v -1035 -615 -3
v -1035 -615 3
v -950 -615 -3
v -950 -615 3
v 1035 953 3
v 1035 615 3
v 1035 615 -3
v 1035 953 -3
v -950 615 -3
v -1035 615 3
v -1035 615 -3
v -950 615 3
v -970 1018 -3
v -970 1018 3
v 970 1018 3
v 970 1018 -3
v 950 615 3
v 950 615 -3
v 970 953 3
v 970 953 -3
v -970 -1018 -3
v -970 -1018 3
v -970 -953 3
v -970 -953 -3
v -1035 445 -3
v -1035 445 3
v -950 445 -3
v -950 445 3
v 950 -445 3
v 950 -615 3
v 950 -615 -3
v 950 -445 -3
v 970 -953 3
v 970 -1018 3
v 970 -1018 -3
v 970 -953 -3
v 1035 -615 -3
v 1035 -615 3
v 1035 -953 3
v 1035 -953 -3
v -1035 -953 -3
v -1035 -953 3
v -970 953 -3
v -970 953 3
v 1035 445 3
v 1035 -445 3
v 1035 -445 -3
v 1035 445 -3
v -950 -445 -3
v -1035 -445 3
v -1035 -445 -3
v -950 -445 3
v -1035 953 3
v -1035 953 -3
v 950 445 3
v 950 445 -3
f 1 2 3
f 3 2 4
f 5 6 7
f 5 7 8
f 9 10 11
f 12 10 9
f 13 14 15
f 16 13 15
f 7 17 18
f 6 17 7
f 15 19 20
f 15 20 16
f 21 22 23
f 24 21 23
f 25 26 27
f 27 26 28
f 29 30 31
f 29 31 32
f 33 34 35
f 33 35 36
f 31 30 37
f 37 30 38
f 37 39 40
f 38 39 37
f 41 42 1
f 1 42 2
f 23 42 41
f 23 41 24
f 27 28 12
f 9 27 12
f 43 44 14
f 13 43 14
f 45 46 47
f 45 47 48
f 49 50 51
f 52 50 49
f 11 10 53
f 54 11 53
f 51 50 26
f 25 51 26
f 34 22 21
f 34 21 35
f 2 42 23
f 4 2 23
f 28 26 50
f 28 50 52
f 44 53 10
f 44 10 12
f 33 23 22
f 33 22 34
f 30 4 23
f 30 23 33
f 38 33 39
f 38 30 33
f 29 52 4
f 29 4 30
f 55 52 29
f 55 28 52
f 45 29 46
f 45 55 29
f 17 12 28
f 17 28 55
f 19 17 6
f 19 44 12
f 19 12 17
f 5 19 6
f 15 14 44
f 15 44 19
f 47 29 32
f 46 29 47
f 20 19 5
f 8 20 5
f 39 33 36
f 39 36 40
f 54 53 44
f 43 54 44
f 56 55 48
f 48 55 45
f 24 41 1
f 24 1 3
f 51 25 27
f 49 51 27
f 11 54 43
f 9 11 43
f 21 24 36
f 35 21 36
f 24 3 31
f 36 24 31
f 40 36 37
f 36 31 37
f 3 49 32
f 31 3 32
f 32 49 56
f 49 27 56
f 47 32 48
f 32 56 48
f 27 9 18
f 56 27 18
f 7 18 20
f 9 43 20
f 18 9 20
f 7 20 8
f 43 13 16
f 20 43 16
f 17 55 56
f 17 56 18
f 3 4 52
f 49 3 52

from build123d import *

# Parameters (mm, degrees)
F0_W     = 2070
F0_H     = 2036
F1_DEPTH = 3
F2_W     = 65
F2_H     = 65
F2_W_2   = 170
F2_H_2   = 170
F3_DEPTH = 6.001


with BuildPart() as f1:
    # F0 (on Top) → F1 (new body, symmetric)
    with BuildSketch(Plane.XY):
        Rectangle(F0_W, F0_H)
    extrude(amount=F1_DEPTH, both=True)

    # F2 (on face) → F3 (cut, through all)
    with BuildSketch(Plane.XY.offset(3)):
        with Locations((-1002.5, 985.5)):
            Rectangle(F2_W, F2_H)
        with Locations((-1035, 530)):
            Rectangle(F2_W_2, F2_H_2)
        with Locations((-1002.5, -985.5)):
            Rectangle(F2_W, F2_H)
        with Locations((-1035, -530)):
            Rectangle(F2_W_2, F2_H_2)
        with Locations((1002.5, 985.5)):
            Rectangle(F2_W, F2_H)
        with Locations((1002.5, -985.5)):
            Rectangle(F2_W, F2_H)
        with Locations((1035, -530)):
            Rectangle(F2_W_2, F2_H_2)
        with Locations((1035, 530)):
            Rectangle(F2_W_2, F2_H_2)
    extrude(amount=-F3_DEPTH, mode=Mode.SUBTRACT)


solid = f1.part
